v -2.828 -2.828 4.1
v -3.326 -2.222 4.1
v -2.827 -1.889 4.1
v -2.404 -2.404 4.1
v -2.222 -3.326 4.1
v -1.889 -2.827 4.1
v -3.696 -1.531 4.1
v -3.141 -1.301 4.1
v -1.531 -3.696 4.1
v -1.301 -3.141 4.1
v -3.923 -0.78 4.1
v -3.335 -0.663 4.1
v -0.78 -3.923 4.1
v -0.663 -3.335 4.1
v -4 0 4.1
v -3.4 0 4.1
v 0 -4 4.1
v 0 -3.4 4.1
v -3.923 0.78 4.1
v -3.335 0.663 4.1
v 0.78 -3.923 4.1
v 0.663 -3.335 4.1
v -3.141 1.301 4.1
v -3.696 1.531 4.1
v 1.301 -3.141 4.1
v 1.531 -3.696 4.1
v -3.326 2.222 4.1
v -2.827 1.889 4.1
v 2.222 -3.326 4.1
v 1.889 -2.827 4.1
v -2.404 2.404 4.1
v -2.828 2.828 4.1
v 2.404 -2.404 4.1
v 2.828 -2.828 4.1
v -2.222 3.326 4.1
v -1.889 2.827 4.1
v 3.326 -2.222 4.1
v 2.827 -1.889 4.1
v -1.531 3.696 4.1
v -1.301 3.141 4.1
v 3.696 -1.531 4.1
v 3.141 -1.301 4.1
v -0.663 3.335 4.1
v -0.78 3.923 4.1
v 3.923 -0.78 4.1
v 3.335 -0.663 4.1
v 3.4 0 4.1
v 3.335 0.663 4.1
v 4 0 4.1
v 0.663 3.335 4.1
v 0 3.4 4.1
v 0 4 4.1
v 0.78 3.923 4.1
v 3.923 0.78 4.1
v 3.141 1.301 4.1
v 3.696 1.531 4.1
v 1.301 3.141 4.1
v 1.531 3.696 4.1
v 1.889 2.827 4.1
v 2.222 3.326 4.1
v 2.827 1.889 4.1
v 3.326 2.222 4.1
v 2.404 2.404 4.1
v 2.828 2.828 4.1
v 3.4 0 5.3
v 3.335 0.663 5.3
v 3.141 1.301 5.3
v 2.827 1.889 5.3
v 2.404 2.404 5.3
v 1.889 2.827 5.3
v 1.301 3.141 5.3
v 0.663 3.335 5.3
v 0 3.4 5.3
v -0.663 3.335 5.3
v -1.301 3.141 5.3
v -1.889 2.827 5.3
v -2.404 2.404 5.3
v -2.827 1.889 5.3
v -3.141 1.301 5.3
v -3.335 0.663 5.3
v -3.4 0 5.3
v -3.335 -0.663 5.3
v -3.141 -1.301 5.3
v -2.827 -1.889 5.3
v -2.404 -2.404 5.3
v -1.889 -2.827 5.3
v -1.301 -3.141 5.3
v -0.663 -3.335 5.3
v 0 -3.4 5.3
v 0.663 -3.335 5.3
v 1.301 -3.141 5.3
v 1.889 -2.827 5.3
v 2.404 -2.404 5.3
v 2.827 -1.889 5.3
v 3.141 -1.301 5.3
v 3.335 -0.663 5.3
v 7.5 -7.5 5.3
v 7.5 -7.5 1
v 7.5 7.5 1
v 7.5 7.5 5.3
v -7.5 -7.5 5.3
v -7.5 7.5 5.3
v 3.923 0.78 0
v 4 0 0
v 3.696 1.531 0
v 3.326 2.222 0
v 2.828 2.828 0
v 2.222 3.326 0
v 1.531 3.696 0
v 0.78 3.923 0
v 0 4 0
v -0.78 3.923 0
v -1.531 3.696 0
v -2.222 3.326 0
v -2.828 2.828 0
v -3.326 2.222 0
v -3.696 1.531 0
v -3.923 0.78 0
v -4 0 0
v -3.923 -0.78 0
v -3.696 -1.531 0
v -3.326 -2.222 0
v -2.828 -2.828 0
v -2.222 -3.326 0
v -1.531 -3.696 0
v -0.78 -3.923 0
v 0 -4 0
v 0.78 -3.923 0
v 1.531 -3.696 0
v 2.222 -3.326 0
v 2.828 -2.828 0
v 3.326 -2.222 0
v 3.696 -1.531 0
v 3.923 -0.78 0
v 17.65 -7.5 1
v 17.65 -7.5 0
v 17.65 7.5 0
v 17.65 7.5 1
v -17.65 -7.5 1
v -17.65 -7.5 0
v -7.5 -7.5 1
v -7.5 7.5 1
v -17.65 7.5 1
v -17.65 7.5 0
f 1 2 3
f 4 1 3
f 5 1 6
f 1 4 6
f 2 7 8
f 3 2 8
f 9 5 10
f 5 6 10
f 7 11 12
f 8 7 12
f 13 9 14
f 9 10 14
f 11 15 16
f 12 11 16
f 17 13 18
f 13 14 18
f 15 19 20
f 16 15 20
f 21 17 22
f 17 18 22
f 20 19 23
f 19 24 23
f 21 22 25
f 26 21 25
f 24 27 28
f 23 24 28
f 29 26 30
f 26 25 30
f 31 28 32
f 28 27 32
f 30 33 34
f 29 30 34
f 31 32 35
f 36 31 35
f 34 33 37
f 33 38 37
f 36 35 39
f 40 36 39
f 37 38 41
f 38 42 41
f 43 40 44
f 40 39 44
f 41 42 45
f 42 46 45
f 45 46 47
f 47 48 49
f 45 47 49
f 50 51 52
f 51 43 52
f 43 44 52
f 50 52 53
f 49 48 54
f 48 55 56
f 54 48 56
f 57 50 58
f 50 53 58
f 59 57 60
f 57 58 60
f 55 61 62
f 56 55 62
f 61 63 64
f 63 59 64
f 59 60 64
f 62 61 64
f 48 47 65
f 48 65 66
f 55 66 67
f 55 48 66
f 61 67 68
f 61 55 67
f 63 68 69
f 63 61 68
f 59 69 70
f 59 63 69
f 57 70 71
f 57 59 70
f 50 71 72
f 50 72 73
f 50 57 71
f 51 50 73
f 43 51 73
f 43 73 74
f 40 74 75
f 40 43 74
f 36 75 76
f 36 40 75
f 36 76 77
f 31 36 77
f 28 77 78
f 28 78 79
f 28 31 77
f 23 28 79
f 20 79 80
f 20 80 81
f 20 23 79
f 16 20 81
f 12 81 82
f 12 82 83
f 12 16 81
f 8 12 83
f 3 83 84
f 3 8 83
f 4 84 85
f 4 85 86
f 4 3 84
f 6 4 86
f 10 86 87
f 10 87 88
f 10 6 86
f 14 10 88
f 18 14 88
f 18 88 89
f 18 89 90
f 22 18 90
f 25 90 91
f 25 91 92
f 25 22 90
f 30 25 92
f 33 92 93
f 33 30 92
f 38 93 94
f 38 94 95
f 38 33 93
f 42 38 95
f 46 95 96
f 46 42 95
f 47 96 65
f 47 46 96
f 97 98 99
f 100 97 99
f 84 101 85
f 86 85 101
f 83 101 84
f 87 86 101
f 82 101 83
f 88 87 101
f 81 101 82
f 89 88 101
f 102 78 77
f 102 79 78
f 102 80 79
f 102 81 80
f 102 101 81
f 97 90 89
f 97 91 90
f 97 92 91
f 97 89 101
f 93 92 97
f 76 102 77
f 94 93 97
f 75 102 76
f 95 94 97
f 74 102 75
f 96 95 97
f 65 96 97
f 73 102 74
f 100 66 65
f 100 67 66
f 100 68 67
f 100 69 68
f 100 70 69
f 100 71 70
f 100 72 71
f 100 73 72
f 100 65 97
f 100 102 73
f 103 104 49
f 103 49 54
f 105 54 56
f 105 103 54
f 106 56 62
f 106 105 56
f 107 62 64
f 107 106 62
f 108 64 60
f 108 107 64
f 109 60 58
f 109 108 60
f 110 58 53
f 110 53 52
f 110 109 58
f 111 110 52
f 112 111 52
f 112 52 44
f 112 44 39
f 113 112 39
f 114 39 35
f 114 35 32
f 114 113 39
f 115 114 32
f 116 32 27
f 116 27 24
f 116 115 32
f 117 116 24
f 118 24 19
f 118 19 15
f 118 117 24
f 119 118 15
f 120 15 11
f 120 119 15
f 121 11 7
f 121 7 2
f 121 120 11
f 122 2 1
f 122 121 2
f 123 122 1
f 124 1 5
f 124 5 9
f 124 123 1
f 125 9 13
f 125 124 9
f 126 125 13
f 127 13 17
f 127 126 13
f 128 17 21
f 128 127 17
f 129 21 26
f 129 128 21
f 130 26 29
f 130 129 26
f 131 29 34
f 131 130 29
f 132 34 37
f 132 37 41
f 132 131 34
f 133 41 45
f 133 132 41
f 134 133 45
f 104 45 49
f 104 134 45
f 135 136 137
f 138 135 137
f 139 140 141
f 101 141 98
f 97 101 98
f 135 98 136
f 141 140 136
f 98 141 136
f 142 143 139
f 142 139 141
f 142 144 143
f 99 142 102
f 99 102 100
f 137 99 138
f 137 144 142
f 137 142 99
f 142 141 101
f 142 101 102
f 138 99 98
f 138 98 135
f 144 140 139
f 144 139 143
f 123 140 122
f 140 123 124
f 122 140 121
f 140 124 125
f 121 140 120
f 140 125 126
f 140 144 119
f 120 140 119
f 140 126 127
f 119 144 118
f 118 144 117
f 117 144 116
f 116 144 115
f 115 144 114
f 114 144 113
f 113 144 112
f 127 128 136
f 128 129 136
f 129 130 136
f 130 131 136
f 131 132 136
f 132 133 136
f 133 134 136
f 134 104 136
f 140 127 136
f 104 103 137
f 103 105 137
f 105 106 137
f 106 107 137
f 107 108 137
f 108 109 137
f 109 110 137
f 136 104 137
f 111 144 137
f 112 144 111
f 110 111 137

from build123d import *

# Parameters (mm, degrees)
CYLINDER_R        = 4
CYLINDER_DEPTH    = 4.1
CYLINDER001_R     = 3.4
CYLINDER001_DEPTH = 1.2
BOX001_W          = 35.3
BOX001_H          = 15
BOX001_DEPTH      = 1
BOX_W             = 15
BOX_H             = 15
BOX_DEPTH         = 5.3


with BuildPart() as lentesgruesos:
    # Cylinder → Cylinder (new body)
    with BuildSketch(Plane.XY):
        Circle(CYLINDER_R)
    extrude(amount=CYLINDER_DEPTH)


with BuildPart() as lente:
    # Cylinder001 → Cylinder001 (new body)
    with BuildSketch(Plane.XY.offset(4.1)):
        Circle(CYLINDER001_R)
    extrude(amount=CYLINDER001_DEPTH)

    # Fusion: union lentesGruesos
    add(lentesgruesos.part)


with BuildPart() as correa:
    # Box001 → Box001 (new body)
    with BuildSketch(Plane(origin=(-17.65, -7.5, 0), x_dir=(1, 0, 0), z_dir=(0, 0, 1))):
        with Locations((17.65, 7.5)):
            Rectangle(BOX001_W, BOX001_H)
    extrude(amount=BOX001_DEPTH)


with BuildPart() as cut:
    # Box → Box (new body)
    with BuildSketch(Plane(origin=(-7.5, -7.5, 0), x_dir=(1, 0, 0), z_dir=(0, 0, 1))):
        with Locations((7.5, 7.5)):
            Rectangle(BOX_W, BOX_H)
    extrude(amount=BOX_DEPTH)

    # Fusion001: union correa
    add(correa.part)

    # Cut: cut lente
    add(lente.part, mode=Mode.SUBTRACT)


solid = cut.part
